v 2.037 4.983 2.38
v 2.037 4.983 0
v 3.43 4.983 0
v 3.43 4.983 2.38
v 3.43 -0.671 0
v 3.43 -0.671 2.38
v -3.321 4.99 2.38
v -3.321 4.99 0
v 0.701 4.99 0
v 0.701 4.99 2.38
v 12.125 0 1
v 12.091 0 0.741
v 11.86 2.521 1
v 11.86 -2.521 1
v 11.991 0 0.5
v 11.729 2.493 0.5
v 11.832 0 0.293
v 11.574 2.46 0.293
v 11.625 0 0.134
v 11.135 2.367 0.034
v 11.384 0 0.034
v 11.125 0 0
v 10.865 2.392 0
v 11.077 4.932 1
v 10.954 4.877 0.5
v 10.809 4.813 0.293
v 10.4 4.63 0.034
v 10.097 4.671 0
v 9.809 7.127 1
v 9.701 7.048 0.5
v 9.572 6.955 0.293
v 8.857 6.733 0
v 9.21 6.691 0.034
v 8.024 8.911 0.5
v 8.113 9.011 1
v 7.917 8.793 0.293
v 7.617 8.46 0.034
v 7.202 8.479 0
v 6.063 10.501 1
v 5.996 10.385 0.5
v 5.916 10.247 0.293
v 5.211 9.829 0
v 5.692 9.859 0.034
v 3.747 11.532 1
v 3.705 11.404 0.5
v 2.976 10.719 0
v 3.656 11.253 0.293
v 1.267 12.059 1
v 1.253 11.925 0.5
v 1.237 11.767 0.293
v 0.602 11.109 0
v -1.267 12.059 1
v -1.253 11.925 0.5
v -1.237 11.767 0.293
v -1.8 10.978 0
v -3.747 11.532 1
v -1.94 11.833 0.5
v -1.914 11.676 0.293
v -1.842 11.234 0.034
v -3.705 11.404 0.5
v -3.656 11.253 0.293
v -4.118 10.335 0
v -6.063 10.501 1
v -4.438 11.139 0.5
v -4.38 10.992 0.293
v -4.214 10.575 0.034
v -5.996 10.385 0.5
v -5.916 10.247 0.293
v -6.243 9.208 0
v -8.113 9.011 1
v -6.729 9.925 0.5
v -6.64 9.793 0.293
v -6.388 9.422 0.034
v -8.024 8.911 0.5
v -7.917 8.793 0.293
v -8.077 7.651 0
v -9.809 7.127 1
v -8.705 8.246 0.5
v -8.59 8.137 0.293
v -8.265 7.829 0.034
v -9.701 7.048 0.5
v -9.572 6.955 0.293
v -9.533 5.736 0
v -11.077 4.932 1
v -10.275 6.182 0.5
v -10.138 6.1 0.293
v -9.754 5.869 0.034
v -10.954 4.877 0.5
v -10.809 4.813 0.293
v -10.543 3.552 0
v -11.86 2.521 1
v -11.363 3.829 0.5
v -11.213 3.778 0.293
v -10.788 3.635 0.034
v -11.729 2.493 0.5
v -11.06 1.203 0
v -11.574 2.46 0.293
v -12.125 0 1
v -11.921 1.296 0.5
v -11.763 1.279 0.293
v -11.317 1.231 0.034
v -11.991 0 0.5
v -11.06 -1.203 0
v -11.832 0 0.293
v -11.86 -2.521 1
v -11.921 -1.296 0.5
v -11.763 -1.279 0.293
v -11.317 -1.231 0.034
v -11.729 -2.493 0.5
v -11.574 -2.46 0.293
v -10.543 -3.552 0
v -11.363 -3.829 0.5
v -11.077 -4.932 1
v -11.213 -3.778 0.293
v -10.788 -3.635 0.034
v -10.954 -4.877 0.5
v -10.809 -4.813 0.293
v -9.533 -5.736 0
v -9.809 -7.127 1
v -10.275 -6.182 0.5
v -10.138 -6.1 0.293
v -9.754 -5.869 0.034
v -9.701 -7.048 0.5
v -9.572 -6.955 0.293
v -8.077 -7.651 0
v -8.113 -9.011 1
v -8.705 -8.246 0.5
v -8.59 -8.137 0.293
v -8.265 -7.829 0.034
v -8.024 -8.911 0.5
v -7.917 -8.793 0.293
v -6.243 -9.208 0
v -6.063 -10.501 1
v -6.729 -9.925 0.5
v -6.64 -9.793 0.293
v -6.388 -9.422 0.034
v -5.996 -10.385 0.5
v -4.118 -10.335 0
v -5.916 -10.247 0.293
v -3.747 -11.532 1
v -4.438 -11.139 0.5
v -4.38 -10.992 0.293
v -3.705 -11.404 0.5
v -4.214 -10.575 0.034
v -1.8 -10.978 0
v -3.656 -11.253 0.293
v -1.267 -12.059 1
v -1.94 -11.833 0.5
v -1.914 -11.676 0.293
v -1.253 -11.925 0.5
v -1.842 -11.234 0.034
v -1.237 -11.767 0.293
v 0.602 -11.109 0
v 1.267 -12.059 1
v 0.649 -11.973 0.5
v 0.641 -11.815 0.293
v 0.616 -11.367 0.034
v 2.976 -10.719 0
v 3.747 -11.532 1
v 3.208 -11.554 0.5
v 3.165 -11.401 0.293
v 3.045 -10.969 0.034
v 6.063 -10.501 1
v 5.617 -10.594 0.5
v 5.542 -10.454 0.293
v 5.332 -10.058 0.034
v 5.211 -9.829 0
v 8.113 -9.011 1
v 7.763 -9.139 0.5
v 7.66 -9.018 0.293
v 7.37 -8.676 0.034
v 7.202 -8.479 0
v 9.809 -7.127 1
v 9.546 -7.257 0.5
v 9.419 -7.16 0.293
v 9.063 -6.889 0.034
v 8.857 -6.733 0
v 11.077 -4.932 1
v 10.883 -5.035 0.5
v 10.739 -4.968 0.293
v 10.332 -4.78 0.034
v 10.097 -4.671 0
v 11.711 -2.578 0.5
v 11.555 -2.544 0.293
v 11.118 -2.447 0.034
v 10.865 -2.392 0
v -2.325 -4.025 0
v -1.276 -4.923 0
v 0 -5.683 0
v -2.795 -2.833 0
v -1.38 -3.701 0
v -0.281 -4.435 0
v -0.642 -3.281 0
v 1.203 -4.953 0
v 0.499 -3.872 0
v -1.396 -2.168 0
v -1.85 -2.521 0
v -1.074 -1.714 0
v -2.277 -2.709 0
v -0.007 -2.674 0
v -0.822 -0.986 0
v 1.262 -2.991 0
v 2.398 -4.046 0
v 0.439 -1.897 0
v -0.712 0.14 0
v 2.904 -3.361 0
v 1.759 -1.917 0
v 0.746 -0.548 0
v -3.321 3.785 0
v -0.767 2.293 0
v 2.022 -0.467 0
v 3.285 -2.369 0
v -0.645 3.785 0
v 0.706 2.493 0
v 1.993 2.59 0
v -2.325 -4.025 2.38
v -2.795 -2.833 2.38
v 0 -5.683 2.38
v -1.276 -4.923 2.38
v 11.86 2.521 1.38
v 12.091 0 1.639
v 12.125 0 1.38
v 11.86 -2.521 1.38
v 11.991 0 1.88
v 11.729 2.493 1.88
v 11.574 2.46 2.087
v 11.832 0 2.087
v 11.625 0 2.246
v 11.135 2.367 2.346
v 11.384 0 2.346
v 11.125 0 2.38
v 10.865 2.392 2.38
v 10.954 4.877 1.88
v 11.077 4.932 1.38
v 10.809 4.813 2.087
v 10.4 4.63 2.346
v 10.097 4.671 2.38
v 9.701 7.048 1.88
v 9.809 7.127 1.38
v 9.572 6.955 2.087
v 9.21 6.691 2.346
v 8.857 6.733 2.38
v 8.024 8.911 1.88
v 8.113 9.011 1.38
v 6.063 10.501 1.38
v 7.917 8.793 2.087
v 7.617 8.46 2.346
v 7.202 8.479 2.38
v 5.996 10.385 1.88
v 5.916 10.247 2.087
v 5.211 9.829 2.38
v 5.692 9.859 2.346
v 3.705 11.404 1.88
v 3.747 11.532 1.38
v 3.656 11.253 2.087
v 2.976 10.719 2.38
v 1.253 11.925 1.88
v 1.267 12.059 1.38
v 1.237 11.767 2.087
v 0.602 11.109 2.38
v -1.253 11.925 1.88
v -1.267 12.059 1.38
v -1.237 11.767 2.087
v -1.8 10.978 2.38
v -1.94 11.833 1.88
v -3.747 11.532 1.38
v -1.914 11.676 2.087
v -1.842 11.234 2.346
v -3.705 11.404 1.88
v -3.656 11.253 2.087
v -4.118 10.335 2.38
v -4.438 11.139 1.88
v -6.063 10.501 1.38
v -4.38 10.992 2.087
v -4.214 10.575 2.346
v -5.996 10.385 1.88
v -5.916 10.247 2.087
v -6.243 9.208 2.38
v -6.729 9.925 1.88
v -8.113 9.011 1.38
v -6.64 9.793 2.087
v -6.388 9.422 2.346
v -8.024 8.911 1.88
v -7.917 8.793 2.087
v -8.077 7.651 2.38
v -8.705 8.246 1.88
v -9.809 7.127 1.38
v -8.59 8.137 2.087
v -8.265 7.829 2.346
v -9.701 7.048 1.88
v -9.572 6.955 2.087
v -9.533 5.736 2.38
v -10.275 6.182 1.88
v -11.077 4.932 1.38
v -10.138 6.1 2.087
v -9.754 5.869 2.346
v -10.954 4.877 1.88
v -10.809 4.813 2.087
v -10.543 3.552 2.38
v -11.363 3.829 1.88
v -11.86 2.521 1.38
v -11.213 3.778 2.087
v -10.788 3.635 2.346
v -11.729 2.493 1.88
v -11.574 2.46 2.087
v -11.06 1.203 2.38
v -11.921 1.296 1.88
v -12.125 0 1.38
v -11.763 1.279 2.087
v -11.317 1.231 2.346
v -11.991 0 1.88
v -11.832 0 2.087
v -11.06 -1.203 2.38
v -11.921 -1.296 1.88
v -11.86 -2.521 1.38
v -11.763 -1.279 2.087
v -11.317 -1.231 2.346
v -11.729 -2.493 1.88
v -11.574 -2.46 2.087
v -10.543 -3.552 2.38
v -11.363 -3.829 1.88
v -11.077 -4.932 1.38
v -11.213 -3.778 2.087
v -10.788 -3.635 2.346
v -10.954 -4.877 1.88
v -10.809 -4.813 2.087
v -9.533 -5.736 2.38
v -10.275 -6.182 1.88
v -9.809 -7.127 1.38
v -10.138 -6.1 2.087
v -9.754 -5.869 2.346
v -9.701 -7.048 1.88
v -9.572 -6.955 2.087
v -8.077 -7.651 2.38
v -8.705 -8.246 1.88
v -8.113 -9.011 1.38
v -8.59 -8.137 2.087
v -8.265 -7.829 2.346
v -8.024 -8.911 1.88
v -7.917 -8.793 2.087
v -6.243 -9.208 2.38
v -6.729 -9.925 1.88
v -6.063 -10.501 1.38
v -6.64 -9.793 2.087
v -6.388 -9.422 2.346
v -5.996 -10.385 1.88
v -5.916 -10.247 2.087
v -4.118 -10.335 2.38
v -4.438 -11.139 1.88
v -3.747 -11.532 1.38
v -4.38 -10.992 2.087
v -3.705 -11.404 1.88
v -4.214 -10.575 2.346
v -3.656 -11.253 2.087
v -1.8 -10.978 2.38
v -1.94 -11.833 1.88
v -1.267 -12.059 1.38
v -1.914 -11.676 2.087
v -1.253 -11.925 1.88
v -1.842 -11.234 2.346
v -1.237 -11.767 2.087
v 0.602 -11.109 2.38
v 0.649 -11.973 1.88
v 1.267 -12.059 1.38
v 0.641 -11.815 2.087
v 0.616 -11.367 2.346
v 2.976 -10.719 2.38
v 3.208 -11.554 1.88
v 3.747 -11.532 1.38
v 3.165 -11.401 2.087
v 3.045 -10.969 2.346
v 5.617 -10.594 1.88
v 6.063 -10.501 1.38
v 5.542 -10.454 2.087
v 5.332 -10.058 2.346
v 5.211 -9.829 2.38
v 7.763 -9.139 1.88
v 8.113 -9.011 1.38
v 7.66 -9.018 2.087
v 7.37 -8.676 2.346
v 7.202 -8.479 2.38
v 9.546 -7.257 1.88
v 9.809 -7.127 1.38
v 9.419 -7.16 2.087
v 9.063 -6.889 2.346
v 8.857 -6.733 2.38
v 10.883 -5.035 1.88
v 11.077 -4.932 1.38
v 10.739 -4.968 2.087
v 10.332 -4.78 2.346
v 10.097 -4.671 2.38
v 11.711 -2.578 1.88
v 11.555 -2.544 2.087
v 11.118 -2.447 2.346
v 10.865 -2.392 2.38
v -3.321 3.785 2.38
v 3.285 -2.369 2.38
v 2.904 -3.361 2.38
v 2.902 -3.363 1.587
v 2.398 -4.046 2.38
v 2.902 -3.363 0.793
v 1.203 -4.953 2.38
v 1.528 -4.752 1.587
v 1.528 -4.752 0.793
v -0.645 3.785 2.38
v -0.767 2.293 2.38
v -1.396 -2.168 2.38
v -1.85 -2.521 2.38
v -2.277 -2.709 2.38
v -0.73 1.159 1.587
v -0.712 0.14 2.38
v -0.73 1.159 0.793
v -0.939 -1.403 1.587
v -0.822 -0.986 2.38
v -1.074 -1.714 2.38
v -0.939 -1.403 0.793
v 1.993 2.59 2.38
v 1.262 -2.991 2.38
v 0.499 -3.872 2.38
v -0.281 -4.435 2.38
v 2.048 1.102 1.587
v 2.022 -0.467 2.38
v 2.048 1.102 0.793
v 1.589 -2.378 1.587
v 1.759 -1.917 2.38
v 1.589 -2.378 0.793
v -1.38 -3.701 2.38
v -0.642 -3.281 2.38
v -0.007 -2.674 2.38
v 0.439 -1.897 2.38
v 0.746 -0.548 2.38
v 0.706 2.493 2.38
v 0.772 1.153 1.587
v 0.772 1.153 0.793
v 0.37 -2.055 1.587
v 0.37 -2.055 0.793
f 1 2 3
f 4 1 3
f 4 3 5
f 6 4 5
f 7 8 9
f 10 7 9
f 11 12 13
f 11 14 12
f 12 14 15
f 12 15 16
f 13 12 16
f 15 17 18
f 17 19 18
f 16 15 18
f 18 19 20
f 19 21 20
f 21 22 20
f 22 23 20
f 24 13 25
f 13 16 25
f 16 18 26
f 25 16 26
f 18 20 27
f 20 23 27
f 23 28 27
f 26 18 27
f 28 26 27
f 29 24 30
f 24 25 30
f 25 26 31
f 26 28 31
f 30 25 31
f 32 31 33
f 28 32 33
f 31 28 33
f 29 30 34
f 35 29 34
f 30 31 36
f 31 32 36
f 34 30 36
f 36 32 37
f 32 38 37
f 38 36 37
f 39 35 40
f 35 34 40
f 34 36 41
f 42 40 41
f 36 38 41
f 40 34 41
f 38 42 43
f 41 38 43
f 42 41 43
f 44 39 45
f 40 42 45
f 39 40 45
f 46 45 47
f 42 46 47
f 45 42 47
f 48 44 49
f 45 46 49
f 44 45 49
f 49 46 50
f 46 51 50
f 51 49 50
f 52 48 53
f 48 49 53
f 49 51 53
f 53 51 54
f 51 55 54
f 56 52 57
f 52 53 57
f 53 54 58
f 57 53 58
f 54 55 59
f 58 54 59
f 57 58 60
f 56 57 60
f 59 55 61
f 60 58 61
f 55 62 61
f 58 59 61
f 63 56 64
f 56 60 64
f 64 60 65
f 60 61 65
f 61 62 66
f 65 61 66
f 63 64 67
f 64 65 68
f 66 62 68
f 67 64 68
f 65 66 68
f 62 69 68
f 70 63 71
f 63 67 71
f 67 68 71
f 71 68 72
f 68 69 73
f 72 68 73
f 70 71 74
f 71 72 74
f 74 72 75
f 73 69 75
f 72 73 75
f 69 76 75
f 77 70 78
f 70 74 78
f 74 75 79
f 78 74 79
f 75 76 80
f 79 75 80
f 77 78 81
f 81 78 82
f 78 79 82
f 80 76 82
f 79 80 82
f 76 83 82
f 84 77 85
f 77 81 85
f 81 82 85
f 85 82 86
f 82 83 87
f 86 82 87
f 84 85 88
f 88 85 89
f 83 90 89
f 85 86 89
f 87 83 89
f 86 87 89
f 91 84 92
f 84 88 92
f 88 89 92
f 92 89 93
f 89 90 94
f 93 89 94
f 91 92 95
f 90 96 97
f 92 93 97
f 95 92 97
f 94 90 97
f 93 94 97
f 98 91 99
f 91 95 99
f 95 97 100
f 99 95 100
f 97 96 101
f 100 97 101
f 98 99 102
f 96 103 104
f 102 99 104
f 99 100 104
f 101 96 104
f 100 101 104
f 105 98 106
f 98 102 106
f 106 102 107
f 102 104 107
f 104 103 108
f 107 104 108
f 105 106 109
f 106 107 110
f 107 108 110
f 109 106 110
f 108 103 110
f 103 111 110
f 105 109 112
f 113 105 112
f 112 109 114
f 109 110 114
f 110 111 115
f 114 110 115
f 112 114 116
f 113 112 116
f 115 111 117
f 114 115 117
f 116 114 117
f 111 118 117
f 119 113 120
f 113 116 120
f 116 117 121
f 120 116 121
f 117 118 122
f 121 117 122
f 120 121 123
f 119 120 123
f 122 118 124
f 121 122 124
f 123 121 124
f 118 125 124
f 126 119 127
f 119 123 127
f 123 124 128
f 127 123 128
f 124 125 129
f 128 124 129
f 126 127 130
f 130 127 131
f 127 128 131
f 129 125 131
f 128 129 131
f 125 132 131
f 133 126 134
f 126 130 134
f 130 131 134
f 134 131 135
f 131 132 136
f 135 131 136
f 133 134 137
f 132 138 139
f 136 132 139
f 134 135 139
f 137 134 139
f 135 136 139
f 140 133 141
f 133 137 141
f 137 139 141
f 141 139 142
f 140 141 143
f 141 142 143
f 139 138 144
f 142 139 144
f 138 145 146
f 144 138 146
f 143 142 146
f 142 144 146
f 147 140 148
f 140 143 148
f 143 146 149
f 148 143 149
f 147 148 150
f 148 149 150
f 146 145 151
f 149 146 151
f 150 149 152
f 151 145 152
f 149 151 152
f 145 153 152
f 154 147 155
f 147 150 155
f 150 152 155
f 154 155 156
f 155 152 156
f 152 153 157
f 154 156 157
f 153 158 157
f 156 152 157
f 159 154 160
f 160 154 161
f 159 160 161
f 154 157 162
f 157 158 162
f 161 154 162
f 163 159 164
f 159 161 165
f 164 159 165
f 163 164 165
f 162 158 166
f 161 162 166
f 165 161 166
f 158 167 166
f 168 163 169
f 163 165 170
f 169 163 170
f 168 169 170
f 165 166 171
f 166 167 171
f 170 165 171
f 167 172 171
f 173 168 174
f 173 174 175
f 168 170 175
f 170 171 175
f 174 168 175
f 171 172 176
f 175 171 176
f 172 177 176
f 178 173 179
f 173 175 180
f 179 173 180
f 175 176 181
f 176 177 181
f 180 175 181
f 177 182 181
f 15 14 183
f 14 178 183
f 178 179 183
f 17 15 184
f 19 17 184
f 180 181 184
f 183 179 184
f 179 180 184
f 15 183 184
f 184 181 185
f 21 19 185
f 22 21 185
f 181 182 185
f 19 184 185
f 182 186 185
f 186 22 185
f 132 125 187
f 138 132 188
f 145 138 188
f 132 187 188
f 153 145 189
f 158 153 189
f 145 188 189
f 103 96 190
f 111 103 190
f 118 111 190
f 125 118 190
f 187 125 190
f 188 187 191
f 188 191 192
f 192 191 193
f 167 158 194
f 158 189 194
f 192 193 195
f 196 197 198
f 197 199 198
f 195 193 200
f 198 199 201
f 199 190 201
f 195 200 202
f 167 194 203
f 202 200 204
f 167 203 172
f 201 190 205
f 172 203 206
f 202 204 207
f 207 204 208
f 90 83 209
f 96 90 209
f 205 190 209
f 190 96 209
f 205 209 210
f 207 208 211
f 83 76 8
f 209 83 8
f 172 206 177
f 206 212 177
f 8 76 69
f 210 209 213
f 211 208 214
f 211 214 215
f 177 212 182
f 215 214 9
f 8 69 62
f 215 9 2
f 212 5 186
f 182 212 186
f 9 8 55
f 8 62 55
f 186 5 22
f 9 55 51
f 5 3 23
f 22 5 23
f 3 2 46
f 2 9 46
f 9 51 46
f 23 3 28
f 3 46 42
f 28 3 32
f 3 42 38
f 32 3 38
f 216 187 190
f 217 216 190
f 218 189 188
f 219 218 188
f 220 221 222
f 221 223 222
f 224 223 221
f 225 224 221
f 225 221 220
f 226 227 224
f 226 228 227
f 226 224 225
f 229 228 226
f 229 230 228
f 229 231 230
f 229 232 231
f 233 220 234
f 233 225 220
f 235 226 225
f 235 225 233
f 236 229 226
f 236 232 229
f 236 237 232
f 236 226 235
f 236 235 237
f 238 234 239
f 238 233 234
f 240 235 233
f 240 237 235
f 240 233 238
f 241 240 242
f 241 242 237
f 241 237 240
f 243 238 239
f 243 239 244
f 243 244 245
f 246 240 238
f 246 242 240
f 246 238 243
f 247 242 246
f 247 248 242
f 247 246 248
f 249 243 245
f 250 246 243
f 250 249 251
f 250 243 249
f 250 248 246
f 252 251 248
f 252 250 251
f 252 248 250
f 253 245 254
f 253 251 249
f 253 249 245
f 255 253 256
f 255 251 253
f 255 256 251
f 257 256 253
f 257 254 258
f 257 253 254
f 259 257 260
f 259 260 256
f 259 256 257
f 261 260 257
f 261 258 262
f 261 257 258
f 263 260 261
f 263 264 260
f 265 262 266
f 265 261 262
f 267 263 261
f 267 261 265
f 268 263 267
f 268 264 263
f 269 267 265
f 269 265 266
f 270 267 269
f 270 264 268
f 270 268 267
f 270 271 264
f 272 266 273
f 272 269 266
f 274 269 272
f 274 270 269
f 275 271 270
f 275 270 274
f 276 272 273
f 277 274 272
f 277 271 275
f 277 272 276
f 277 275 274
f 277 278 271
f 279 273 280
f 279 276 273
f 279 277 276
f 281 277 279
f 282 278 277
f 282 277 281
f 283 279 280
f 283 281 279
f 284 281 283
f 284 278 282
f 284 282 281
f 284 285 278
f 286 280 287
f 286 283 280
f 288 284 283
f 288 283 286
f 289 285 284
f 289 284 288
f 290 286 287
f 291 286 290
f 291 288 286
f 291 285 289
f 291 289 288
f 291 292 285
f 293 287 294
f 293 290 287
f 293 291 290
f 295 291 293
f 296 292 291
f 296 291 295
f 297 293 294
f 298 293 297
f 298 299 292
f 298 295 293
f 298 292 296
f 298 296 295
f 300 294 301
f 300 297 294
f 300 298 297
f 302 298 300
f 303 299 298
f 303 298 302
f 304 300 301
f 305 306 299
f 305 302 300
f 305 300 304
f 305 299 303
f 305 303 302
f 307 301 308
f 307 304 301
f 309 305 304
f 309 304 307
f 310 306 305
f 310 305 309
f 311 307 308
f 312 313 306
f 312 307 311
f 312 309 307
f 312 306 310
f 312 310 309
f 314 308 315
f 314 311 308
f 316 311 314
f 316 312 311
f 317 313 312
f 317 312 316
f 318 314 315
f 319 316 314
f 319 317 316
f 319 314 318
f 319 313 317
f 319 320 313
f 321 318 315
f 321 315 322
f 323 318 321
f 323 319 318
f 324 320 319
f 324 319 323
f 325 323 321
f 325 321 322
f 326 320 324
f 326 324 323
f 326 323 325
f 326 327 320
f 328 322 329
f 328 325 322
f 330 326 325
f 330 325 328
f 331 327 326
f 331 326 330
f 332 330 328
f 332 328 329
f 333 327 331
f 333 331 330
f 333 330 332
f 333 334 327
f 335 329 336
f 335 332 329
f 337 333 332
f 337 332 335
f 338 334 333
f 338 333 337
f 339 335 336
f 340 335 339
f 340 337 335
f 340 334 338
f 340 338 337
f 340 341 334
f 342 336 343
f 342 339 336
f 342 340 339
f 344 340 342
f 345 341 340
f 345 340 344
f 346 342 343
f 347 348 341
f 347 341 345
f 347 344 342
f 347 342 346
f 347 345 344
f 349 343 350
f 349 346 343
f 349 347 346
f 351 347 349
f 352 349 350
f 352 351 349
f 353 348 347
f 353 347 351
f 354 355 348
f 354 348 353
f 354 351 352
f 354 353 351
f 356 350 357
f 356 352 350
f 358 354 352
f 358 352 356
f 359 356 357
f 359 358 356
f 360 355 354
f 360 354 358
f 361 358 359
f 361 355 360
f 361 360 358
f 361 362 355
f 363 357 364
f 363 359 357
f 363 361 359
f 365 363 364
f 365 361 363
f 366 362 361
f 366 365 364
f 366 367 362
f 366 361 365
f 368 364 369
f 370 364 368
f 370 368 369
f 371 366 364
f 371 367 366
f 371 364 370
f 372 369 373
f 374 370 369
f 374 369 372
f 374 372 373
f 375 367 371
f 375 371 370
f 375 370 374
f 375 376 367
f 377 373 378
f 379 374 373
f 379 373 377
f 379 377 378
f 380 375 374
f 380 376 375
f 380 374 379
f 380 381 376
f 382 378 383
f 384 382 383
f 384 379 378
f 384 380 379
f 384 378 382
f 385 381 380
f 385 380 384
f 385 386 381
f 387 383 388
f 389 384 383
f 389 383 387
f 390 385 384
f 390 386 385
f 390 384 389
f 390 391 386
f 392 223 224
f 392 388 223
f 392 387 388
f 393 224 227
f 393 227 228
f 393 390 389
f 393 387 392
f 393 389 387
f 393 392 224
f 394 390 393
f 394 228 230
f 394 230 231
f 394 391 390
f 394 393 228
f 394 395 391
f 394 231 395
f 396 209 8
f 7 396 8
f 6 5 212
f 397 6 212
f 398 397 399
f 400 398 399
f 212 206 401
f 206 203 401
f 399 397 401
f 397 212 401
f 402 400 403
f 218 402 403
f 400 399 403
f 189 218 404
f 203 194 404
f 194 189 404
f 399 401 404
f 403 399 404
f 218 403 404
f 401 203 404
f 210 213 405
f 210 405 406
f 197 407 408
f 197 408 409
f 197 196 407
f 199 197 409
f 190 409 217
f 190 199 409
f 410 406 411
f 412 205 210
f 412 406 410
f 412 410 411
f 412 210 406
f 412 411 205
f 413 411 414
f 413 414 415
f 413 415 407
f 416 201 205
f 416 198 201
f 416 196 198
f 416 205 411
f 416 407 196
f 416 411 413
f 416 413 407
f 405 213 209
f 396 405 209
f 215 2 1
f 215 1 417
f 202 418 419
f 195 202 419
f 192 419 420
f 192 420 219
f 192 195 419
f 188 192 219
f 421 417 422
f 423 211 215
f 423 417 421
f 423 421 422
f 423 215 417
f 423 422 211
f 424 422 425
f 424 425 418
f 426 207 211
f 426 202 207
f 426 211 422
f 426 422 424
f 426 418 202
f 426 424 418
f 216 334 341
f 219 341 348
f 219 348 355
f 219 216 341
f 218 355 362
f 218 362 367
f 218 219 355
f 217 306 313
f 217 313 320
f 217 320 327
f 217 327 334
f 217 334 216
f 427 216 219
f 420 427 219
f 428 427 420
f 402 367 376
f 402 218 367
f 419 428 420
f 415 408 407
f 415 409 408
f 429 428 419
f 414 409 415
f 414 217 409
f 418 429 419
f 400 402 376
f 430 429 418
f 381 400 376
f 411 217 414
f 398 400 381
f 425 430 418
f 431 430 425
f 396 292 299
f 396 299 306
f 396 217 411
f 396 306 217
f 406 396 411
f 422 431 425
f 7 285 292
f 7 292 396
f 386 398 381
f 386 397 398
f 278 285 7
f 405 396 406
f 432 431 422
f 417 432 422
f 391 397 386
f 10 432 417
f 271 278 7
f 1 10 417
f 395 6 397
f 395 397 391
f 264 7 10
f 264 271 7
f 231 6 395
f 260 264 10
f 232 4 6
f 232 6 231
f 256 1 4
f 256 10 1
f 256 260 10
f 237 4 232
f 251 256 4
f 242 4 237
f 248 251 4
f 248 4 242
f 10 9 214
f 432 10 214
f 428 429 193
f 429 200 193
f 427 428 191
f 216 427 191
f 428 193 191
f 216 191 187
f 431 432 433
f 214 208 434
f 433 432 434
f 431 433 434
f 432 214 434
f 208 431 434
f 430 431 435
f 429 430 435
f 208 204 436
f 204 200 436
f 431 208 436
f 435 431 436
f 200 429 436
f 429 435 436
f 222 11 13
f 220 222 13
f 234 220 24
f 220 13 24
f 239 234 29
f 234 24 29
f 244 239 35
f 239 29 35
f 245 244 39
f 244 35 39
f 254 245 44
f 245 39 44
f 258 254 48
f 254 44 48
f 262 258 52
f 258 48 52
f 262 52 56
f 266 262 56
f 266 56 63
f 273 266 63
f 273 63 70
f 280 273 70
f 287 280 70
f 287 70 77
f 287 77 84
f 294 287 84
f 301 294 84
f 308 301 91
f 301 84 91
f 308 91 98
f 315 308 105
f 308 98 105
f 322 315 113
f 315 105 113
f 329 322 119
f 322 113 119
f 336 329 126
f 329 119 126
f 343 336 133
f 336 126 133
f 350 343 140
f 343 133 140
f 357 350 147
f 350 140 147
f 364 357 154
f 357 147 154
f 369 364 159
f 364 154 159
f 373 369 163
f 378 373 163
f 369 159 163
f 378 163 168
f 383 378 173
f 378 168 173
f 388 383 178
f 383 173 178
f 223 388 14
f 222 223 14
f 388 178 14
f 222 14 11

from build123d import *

# Parameters (mm, degrees)
F0_R     = 12.125
F1_DEPTH = 2.38
F2_R     = 1


with BuildPart() as f1:
    # F0 (on Top) → F1 (new body)
    with BuildSketch(Plane.XY):
        Circle(F0_R)
        with BuildLine():
            add(Edge.make_bspline(
                [(2.036581, 4.983431), (1.639226, 1.080341), (3.435804, -3.024245), (-1.276224, -4.923354)],
                knots=[0, 0, 0, 0, 10.446007, 10.446007, 10.446007, 10.446007], degree=3))
            Line((2.036581, 4.983431), (3.429502, 4.983431))
            Line((3.429502, 4.983431), (3.429502, -0.670792))
            add(Edge.make_bspline(
                [(3.429502, -0.670792), (3.556498, -4.298475), (1.374324, -4.697141), (0, -5.683316)],
                knots=[0, 0, 0, 0, 6.073458, 6.073458, 6.073458, 6.073458], degree=3))
            Line((0, -5.683316), (-1.276224, -4.923354))
        make_face(mode=Mode.SUBTRACT)
        with BuildLine():
            Line((-3.320744, 3.784657), (-3.320744, 4.989943))
            Line((-3.320744, 4.989943), (0.701266, 4.989943))
            add(Edge.make_bspline(
                [(0.701266, 4.989943), (0.401681, 1.040562), (2.123402, -2.876976), (-2.325447, -4.02479)],
                knots=[0, 0, 0, 0, 9.509279, 9.509279, 9.509279, 9.509279], degree=3))
            Line((-2.325447, -4.02479), (-2.794653, -2.832613))
            add(Edge.make_bspline(
                [(-0.644522, 3.784657), (-1.176108, 1.48316), (0.391602, -2.325576), (-2.794653, -2.832613)],
                knots=[0, 0, 0, 0, 6.957825, 6.957825, 6.957825, 6.957825], degree=3))
            Line((-0.644522, 3.784657), (-3.320744, 3.784657))
        make_face(mode=Mode.SUBTRACT)
    extrude(amount=F1_DEPTH)

    # F2
    f2_edges = [f1.edges().sort_by_distance(p)[0] for p in [
        (-12.125, 0, 2.38),
        (-12.125, 0, 0),
    ]]
    fillet(f2_edges, radius=F2_R)


solid = f1.part
